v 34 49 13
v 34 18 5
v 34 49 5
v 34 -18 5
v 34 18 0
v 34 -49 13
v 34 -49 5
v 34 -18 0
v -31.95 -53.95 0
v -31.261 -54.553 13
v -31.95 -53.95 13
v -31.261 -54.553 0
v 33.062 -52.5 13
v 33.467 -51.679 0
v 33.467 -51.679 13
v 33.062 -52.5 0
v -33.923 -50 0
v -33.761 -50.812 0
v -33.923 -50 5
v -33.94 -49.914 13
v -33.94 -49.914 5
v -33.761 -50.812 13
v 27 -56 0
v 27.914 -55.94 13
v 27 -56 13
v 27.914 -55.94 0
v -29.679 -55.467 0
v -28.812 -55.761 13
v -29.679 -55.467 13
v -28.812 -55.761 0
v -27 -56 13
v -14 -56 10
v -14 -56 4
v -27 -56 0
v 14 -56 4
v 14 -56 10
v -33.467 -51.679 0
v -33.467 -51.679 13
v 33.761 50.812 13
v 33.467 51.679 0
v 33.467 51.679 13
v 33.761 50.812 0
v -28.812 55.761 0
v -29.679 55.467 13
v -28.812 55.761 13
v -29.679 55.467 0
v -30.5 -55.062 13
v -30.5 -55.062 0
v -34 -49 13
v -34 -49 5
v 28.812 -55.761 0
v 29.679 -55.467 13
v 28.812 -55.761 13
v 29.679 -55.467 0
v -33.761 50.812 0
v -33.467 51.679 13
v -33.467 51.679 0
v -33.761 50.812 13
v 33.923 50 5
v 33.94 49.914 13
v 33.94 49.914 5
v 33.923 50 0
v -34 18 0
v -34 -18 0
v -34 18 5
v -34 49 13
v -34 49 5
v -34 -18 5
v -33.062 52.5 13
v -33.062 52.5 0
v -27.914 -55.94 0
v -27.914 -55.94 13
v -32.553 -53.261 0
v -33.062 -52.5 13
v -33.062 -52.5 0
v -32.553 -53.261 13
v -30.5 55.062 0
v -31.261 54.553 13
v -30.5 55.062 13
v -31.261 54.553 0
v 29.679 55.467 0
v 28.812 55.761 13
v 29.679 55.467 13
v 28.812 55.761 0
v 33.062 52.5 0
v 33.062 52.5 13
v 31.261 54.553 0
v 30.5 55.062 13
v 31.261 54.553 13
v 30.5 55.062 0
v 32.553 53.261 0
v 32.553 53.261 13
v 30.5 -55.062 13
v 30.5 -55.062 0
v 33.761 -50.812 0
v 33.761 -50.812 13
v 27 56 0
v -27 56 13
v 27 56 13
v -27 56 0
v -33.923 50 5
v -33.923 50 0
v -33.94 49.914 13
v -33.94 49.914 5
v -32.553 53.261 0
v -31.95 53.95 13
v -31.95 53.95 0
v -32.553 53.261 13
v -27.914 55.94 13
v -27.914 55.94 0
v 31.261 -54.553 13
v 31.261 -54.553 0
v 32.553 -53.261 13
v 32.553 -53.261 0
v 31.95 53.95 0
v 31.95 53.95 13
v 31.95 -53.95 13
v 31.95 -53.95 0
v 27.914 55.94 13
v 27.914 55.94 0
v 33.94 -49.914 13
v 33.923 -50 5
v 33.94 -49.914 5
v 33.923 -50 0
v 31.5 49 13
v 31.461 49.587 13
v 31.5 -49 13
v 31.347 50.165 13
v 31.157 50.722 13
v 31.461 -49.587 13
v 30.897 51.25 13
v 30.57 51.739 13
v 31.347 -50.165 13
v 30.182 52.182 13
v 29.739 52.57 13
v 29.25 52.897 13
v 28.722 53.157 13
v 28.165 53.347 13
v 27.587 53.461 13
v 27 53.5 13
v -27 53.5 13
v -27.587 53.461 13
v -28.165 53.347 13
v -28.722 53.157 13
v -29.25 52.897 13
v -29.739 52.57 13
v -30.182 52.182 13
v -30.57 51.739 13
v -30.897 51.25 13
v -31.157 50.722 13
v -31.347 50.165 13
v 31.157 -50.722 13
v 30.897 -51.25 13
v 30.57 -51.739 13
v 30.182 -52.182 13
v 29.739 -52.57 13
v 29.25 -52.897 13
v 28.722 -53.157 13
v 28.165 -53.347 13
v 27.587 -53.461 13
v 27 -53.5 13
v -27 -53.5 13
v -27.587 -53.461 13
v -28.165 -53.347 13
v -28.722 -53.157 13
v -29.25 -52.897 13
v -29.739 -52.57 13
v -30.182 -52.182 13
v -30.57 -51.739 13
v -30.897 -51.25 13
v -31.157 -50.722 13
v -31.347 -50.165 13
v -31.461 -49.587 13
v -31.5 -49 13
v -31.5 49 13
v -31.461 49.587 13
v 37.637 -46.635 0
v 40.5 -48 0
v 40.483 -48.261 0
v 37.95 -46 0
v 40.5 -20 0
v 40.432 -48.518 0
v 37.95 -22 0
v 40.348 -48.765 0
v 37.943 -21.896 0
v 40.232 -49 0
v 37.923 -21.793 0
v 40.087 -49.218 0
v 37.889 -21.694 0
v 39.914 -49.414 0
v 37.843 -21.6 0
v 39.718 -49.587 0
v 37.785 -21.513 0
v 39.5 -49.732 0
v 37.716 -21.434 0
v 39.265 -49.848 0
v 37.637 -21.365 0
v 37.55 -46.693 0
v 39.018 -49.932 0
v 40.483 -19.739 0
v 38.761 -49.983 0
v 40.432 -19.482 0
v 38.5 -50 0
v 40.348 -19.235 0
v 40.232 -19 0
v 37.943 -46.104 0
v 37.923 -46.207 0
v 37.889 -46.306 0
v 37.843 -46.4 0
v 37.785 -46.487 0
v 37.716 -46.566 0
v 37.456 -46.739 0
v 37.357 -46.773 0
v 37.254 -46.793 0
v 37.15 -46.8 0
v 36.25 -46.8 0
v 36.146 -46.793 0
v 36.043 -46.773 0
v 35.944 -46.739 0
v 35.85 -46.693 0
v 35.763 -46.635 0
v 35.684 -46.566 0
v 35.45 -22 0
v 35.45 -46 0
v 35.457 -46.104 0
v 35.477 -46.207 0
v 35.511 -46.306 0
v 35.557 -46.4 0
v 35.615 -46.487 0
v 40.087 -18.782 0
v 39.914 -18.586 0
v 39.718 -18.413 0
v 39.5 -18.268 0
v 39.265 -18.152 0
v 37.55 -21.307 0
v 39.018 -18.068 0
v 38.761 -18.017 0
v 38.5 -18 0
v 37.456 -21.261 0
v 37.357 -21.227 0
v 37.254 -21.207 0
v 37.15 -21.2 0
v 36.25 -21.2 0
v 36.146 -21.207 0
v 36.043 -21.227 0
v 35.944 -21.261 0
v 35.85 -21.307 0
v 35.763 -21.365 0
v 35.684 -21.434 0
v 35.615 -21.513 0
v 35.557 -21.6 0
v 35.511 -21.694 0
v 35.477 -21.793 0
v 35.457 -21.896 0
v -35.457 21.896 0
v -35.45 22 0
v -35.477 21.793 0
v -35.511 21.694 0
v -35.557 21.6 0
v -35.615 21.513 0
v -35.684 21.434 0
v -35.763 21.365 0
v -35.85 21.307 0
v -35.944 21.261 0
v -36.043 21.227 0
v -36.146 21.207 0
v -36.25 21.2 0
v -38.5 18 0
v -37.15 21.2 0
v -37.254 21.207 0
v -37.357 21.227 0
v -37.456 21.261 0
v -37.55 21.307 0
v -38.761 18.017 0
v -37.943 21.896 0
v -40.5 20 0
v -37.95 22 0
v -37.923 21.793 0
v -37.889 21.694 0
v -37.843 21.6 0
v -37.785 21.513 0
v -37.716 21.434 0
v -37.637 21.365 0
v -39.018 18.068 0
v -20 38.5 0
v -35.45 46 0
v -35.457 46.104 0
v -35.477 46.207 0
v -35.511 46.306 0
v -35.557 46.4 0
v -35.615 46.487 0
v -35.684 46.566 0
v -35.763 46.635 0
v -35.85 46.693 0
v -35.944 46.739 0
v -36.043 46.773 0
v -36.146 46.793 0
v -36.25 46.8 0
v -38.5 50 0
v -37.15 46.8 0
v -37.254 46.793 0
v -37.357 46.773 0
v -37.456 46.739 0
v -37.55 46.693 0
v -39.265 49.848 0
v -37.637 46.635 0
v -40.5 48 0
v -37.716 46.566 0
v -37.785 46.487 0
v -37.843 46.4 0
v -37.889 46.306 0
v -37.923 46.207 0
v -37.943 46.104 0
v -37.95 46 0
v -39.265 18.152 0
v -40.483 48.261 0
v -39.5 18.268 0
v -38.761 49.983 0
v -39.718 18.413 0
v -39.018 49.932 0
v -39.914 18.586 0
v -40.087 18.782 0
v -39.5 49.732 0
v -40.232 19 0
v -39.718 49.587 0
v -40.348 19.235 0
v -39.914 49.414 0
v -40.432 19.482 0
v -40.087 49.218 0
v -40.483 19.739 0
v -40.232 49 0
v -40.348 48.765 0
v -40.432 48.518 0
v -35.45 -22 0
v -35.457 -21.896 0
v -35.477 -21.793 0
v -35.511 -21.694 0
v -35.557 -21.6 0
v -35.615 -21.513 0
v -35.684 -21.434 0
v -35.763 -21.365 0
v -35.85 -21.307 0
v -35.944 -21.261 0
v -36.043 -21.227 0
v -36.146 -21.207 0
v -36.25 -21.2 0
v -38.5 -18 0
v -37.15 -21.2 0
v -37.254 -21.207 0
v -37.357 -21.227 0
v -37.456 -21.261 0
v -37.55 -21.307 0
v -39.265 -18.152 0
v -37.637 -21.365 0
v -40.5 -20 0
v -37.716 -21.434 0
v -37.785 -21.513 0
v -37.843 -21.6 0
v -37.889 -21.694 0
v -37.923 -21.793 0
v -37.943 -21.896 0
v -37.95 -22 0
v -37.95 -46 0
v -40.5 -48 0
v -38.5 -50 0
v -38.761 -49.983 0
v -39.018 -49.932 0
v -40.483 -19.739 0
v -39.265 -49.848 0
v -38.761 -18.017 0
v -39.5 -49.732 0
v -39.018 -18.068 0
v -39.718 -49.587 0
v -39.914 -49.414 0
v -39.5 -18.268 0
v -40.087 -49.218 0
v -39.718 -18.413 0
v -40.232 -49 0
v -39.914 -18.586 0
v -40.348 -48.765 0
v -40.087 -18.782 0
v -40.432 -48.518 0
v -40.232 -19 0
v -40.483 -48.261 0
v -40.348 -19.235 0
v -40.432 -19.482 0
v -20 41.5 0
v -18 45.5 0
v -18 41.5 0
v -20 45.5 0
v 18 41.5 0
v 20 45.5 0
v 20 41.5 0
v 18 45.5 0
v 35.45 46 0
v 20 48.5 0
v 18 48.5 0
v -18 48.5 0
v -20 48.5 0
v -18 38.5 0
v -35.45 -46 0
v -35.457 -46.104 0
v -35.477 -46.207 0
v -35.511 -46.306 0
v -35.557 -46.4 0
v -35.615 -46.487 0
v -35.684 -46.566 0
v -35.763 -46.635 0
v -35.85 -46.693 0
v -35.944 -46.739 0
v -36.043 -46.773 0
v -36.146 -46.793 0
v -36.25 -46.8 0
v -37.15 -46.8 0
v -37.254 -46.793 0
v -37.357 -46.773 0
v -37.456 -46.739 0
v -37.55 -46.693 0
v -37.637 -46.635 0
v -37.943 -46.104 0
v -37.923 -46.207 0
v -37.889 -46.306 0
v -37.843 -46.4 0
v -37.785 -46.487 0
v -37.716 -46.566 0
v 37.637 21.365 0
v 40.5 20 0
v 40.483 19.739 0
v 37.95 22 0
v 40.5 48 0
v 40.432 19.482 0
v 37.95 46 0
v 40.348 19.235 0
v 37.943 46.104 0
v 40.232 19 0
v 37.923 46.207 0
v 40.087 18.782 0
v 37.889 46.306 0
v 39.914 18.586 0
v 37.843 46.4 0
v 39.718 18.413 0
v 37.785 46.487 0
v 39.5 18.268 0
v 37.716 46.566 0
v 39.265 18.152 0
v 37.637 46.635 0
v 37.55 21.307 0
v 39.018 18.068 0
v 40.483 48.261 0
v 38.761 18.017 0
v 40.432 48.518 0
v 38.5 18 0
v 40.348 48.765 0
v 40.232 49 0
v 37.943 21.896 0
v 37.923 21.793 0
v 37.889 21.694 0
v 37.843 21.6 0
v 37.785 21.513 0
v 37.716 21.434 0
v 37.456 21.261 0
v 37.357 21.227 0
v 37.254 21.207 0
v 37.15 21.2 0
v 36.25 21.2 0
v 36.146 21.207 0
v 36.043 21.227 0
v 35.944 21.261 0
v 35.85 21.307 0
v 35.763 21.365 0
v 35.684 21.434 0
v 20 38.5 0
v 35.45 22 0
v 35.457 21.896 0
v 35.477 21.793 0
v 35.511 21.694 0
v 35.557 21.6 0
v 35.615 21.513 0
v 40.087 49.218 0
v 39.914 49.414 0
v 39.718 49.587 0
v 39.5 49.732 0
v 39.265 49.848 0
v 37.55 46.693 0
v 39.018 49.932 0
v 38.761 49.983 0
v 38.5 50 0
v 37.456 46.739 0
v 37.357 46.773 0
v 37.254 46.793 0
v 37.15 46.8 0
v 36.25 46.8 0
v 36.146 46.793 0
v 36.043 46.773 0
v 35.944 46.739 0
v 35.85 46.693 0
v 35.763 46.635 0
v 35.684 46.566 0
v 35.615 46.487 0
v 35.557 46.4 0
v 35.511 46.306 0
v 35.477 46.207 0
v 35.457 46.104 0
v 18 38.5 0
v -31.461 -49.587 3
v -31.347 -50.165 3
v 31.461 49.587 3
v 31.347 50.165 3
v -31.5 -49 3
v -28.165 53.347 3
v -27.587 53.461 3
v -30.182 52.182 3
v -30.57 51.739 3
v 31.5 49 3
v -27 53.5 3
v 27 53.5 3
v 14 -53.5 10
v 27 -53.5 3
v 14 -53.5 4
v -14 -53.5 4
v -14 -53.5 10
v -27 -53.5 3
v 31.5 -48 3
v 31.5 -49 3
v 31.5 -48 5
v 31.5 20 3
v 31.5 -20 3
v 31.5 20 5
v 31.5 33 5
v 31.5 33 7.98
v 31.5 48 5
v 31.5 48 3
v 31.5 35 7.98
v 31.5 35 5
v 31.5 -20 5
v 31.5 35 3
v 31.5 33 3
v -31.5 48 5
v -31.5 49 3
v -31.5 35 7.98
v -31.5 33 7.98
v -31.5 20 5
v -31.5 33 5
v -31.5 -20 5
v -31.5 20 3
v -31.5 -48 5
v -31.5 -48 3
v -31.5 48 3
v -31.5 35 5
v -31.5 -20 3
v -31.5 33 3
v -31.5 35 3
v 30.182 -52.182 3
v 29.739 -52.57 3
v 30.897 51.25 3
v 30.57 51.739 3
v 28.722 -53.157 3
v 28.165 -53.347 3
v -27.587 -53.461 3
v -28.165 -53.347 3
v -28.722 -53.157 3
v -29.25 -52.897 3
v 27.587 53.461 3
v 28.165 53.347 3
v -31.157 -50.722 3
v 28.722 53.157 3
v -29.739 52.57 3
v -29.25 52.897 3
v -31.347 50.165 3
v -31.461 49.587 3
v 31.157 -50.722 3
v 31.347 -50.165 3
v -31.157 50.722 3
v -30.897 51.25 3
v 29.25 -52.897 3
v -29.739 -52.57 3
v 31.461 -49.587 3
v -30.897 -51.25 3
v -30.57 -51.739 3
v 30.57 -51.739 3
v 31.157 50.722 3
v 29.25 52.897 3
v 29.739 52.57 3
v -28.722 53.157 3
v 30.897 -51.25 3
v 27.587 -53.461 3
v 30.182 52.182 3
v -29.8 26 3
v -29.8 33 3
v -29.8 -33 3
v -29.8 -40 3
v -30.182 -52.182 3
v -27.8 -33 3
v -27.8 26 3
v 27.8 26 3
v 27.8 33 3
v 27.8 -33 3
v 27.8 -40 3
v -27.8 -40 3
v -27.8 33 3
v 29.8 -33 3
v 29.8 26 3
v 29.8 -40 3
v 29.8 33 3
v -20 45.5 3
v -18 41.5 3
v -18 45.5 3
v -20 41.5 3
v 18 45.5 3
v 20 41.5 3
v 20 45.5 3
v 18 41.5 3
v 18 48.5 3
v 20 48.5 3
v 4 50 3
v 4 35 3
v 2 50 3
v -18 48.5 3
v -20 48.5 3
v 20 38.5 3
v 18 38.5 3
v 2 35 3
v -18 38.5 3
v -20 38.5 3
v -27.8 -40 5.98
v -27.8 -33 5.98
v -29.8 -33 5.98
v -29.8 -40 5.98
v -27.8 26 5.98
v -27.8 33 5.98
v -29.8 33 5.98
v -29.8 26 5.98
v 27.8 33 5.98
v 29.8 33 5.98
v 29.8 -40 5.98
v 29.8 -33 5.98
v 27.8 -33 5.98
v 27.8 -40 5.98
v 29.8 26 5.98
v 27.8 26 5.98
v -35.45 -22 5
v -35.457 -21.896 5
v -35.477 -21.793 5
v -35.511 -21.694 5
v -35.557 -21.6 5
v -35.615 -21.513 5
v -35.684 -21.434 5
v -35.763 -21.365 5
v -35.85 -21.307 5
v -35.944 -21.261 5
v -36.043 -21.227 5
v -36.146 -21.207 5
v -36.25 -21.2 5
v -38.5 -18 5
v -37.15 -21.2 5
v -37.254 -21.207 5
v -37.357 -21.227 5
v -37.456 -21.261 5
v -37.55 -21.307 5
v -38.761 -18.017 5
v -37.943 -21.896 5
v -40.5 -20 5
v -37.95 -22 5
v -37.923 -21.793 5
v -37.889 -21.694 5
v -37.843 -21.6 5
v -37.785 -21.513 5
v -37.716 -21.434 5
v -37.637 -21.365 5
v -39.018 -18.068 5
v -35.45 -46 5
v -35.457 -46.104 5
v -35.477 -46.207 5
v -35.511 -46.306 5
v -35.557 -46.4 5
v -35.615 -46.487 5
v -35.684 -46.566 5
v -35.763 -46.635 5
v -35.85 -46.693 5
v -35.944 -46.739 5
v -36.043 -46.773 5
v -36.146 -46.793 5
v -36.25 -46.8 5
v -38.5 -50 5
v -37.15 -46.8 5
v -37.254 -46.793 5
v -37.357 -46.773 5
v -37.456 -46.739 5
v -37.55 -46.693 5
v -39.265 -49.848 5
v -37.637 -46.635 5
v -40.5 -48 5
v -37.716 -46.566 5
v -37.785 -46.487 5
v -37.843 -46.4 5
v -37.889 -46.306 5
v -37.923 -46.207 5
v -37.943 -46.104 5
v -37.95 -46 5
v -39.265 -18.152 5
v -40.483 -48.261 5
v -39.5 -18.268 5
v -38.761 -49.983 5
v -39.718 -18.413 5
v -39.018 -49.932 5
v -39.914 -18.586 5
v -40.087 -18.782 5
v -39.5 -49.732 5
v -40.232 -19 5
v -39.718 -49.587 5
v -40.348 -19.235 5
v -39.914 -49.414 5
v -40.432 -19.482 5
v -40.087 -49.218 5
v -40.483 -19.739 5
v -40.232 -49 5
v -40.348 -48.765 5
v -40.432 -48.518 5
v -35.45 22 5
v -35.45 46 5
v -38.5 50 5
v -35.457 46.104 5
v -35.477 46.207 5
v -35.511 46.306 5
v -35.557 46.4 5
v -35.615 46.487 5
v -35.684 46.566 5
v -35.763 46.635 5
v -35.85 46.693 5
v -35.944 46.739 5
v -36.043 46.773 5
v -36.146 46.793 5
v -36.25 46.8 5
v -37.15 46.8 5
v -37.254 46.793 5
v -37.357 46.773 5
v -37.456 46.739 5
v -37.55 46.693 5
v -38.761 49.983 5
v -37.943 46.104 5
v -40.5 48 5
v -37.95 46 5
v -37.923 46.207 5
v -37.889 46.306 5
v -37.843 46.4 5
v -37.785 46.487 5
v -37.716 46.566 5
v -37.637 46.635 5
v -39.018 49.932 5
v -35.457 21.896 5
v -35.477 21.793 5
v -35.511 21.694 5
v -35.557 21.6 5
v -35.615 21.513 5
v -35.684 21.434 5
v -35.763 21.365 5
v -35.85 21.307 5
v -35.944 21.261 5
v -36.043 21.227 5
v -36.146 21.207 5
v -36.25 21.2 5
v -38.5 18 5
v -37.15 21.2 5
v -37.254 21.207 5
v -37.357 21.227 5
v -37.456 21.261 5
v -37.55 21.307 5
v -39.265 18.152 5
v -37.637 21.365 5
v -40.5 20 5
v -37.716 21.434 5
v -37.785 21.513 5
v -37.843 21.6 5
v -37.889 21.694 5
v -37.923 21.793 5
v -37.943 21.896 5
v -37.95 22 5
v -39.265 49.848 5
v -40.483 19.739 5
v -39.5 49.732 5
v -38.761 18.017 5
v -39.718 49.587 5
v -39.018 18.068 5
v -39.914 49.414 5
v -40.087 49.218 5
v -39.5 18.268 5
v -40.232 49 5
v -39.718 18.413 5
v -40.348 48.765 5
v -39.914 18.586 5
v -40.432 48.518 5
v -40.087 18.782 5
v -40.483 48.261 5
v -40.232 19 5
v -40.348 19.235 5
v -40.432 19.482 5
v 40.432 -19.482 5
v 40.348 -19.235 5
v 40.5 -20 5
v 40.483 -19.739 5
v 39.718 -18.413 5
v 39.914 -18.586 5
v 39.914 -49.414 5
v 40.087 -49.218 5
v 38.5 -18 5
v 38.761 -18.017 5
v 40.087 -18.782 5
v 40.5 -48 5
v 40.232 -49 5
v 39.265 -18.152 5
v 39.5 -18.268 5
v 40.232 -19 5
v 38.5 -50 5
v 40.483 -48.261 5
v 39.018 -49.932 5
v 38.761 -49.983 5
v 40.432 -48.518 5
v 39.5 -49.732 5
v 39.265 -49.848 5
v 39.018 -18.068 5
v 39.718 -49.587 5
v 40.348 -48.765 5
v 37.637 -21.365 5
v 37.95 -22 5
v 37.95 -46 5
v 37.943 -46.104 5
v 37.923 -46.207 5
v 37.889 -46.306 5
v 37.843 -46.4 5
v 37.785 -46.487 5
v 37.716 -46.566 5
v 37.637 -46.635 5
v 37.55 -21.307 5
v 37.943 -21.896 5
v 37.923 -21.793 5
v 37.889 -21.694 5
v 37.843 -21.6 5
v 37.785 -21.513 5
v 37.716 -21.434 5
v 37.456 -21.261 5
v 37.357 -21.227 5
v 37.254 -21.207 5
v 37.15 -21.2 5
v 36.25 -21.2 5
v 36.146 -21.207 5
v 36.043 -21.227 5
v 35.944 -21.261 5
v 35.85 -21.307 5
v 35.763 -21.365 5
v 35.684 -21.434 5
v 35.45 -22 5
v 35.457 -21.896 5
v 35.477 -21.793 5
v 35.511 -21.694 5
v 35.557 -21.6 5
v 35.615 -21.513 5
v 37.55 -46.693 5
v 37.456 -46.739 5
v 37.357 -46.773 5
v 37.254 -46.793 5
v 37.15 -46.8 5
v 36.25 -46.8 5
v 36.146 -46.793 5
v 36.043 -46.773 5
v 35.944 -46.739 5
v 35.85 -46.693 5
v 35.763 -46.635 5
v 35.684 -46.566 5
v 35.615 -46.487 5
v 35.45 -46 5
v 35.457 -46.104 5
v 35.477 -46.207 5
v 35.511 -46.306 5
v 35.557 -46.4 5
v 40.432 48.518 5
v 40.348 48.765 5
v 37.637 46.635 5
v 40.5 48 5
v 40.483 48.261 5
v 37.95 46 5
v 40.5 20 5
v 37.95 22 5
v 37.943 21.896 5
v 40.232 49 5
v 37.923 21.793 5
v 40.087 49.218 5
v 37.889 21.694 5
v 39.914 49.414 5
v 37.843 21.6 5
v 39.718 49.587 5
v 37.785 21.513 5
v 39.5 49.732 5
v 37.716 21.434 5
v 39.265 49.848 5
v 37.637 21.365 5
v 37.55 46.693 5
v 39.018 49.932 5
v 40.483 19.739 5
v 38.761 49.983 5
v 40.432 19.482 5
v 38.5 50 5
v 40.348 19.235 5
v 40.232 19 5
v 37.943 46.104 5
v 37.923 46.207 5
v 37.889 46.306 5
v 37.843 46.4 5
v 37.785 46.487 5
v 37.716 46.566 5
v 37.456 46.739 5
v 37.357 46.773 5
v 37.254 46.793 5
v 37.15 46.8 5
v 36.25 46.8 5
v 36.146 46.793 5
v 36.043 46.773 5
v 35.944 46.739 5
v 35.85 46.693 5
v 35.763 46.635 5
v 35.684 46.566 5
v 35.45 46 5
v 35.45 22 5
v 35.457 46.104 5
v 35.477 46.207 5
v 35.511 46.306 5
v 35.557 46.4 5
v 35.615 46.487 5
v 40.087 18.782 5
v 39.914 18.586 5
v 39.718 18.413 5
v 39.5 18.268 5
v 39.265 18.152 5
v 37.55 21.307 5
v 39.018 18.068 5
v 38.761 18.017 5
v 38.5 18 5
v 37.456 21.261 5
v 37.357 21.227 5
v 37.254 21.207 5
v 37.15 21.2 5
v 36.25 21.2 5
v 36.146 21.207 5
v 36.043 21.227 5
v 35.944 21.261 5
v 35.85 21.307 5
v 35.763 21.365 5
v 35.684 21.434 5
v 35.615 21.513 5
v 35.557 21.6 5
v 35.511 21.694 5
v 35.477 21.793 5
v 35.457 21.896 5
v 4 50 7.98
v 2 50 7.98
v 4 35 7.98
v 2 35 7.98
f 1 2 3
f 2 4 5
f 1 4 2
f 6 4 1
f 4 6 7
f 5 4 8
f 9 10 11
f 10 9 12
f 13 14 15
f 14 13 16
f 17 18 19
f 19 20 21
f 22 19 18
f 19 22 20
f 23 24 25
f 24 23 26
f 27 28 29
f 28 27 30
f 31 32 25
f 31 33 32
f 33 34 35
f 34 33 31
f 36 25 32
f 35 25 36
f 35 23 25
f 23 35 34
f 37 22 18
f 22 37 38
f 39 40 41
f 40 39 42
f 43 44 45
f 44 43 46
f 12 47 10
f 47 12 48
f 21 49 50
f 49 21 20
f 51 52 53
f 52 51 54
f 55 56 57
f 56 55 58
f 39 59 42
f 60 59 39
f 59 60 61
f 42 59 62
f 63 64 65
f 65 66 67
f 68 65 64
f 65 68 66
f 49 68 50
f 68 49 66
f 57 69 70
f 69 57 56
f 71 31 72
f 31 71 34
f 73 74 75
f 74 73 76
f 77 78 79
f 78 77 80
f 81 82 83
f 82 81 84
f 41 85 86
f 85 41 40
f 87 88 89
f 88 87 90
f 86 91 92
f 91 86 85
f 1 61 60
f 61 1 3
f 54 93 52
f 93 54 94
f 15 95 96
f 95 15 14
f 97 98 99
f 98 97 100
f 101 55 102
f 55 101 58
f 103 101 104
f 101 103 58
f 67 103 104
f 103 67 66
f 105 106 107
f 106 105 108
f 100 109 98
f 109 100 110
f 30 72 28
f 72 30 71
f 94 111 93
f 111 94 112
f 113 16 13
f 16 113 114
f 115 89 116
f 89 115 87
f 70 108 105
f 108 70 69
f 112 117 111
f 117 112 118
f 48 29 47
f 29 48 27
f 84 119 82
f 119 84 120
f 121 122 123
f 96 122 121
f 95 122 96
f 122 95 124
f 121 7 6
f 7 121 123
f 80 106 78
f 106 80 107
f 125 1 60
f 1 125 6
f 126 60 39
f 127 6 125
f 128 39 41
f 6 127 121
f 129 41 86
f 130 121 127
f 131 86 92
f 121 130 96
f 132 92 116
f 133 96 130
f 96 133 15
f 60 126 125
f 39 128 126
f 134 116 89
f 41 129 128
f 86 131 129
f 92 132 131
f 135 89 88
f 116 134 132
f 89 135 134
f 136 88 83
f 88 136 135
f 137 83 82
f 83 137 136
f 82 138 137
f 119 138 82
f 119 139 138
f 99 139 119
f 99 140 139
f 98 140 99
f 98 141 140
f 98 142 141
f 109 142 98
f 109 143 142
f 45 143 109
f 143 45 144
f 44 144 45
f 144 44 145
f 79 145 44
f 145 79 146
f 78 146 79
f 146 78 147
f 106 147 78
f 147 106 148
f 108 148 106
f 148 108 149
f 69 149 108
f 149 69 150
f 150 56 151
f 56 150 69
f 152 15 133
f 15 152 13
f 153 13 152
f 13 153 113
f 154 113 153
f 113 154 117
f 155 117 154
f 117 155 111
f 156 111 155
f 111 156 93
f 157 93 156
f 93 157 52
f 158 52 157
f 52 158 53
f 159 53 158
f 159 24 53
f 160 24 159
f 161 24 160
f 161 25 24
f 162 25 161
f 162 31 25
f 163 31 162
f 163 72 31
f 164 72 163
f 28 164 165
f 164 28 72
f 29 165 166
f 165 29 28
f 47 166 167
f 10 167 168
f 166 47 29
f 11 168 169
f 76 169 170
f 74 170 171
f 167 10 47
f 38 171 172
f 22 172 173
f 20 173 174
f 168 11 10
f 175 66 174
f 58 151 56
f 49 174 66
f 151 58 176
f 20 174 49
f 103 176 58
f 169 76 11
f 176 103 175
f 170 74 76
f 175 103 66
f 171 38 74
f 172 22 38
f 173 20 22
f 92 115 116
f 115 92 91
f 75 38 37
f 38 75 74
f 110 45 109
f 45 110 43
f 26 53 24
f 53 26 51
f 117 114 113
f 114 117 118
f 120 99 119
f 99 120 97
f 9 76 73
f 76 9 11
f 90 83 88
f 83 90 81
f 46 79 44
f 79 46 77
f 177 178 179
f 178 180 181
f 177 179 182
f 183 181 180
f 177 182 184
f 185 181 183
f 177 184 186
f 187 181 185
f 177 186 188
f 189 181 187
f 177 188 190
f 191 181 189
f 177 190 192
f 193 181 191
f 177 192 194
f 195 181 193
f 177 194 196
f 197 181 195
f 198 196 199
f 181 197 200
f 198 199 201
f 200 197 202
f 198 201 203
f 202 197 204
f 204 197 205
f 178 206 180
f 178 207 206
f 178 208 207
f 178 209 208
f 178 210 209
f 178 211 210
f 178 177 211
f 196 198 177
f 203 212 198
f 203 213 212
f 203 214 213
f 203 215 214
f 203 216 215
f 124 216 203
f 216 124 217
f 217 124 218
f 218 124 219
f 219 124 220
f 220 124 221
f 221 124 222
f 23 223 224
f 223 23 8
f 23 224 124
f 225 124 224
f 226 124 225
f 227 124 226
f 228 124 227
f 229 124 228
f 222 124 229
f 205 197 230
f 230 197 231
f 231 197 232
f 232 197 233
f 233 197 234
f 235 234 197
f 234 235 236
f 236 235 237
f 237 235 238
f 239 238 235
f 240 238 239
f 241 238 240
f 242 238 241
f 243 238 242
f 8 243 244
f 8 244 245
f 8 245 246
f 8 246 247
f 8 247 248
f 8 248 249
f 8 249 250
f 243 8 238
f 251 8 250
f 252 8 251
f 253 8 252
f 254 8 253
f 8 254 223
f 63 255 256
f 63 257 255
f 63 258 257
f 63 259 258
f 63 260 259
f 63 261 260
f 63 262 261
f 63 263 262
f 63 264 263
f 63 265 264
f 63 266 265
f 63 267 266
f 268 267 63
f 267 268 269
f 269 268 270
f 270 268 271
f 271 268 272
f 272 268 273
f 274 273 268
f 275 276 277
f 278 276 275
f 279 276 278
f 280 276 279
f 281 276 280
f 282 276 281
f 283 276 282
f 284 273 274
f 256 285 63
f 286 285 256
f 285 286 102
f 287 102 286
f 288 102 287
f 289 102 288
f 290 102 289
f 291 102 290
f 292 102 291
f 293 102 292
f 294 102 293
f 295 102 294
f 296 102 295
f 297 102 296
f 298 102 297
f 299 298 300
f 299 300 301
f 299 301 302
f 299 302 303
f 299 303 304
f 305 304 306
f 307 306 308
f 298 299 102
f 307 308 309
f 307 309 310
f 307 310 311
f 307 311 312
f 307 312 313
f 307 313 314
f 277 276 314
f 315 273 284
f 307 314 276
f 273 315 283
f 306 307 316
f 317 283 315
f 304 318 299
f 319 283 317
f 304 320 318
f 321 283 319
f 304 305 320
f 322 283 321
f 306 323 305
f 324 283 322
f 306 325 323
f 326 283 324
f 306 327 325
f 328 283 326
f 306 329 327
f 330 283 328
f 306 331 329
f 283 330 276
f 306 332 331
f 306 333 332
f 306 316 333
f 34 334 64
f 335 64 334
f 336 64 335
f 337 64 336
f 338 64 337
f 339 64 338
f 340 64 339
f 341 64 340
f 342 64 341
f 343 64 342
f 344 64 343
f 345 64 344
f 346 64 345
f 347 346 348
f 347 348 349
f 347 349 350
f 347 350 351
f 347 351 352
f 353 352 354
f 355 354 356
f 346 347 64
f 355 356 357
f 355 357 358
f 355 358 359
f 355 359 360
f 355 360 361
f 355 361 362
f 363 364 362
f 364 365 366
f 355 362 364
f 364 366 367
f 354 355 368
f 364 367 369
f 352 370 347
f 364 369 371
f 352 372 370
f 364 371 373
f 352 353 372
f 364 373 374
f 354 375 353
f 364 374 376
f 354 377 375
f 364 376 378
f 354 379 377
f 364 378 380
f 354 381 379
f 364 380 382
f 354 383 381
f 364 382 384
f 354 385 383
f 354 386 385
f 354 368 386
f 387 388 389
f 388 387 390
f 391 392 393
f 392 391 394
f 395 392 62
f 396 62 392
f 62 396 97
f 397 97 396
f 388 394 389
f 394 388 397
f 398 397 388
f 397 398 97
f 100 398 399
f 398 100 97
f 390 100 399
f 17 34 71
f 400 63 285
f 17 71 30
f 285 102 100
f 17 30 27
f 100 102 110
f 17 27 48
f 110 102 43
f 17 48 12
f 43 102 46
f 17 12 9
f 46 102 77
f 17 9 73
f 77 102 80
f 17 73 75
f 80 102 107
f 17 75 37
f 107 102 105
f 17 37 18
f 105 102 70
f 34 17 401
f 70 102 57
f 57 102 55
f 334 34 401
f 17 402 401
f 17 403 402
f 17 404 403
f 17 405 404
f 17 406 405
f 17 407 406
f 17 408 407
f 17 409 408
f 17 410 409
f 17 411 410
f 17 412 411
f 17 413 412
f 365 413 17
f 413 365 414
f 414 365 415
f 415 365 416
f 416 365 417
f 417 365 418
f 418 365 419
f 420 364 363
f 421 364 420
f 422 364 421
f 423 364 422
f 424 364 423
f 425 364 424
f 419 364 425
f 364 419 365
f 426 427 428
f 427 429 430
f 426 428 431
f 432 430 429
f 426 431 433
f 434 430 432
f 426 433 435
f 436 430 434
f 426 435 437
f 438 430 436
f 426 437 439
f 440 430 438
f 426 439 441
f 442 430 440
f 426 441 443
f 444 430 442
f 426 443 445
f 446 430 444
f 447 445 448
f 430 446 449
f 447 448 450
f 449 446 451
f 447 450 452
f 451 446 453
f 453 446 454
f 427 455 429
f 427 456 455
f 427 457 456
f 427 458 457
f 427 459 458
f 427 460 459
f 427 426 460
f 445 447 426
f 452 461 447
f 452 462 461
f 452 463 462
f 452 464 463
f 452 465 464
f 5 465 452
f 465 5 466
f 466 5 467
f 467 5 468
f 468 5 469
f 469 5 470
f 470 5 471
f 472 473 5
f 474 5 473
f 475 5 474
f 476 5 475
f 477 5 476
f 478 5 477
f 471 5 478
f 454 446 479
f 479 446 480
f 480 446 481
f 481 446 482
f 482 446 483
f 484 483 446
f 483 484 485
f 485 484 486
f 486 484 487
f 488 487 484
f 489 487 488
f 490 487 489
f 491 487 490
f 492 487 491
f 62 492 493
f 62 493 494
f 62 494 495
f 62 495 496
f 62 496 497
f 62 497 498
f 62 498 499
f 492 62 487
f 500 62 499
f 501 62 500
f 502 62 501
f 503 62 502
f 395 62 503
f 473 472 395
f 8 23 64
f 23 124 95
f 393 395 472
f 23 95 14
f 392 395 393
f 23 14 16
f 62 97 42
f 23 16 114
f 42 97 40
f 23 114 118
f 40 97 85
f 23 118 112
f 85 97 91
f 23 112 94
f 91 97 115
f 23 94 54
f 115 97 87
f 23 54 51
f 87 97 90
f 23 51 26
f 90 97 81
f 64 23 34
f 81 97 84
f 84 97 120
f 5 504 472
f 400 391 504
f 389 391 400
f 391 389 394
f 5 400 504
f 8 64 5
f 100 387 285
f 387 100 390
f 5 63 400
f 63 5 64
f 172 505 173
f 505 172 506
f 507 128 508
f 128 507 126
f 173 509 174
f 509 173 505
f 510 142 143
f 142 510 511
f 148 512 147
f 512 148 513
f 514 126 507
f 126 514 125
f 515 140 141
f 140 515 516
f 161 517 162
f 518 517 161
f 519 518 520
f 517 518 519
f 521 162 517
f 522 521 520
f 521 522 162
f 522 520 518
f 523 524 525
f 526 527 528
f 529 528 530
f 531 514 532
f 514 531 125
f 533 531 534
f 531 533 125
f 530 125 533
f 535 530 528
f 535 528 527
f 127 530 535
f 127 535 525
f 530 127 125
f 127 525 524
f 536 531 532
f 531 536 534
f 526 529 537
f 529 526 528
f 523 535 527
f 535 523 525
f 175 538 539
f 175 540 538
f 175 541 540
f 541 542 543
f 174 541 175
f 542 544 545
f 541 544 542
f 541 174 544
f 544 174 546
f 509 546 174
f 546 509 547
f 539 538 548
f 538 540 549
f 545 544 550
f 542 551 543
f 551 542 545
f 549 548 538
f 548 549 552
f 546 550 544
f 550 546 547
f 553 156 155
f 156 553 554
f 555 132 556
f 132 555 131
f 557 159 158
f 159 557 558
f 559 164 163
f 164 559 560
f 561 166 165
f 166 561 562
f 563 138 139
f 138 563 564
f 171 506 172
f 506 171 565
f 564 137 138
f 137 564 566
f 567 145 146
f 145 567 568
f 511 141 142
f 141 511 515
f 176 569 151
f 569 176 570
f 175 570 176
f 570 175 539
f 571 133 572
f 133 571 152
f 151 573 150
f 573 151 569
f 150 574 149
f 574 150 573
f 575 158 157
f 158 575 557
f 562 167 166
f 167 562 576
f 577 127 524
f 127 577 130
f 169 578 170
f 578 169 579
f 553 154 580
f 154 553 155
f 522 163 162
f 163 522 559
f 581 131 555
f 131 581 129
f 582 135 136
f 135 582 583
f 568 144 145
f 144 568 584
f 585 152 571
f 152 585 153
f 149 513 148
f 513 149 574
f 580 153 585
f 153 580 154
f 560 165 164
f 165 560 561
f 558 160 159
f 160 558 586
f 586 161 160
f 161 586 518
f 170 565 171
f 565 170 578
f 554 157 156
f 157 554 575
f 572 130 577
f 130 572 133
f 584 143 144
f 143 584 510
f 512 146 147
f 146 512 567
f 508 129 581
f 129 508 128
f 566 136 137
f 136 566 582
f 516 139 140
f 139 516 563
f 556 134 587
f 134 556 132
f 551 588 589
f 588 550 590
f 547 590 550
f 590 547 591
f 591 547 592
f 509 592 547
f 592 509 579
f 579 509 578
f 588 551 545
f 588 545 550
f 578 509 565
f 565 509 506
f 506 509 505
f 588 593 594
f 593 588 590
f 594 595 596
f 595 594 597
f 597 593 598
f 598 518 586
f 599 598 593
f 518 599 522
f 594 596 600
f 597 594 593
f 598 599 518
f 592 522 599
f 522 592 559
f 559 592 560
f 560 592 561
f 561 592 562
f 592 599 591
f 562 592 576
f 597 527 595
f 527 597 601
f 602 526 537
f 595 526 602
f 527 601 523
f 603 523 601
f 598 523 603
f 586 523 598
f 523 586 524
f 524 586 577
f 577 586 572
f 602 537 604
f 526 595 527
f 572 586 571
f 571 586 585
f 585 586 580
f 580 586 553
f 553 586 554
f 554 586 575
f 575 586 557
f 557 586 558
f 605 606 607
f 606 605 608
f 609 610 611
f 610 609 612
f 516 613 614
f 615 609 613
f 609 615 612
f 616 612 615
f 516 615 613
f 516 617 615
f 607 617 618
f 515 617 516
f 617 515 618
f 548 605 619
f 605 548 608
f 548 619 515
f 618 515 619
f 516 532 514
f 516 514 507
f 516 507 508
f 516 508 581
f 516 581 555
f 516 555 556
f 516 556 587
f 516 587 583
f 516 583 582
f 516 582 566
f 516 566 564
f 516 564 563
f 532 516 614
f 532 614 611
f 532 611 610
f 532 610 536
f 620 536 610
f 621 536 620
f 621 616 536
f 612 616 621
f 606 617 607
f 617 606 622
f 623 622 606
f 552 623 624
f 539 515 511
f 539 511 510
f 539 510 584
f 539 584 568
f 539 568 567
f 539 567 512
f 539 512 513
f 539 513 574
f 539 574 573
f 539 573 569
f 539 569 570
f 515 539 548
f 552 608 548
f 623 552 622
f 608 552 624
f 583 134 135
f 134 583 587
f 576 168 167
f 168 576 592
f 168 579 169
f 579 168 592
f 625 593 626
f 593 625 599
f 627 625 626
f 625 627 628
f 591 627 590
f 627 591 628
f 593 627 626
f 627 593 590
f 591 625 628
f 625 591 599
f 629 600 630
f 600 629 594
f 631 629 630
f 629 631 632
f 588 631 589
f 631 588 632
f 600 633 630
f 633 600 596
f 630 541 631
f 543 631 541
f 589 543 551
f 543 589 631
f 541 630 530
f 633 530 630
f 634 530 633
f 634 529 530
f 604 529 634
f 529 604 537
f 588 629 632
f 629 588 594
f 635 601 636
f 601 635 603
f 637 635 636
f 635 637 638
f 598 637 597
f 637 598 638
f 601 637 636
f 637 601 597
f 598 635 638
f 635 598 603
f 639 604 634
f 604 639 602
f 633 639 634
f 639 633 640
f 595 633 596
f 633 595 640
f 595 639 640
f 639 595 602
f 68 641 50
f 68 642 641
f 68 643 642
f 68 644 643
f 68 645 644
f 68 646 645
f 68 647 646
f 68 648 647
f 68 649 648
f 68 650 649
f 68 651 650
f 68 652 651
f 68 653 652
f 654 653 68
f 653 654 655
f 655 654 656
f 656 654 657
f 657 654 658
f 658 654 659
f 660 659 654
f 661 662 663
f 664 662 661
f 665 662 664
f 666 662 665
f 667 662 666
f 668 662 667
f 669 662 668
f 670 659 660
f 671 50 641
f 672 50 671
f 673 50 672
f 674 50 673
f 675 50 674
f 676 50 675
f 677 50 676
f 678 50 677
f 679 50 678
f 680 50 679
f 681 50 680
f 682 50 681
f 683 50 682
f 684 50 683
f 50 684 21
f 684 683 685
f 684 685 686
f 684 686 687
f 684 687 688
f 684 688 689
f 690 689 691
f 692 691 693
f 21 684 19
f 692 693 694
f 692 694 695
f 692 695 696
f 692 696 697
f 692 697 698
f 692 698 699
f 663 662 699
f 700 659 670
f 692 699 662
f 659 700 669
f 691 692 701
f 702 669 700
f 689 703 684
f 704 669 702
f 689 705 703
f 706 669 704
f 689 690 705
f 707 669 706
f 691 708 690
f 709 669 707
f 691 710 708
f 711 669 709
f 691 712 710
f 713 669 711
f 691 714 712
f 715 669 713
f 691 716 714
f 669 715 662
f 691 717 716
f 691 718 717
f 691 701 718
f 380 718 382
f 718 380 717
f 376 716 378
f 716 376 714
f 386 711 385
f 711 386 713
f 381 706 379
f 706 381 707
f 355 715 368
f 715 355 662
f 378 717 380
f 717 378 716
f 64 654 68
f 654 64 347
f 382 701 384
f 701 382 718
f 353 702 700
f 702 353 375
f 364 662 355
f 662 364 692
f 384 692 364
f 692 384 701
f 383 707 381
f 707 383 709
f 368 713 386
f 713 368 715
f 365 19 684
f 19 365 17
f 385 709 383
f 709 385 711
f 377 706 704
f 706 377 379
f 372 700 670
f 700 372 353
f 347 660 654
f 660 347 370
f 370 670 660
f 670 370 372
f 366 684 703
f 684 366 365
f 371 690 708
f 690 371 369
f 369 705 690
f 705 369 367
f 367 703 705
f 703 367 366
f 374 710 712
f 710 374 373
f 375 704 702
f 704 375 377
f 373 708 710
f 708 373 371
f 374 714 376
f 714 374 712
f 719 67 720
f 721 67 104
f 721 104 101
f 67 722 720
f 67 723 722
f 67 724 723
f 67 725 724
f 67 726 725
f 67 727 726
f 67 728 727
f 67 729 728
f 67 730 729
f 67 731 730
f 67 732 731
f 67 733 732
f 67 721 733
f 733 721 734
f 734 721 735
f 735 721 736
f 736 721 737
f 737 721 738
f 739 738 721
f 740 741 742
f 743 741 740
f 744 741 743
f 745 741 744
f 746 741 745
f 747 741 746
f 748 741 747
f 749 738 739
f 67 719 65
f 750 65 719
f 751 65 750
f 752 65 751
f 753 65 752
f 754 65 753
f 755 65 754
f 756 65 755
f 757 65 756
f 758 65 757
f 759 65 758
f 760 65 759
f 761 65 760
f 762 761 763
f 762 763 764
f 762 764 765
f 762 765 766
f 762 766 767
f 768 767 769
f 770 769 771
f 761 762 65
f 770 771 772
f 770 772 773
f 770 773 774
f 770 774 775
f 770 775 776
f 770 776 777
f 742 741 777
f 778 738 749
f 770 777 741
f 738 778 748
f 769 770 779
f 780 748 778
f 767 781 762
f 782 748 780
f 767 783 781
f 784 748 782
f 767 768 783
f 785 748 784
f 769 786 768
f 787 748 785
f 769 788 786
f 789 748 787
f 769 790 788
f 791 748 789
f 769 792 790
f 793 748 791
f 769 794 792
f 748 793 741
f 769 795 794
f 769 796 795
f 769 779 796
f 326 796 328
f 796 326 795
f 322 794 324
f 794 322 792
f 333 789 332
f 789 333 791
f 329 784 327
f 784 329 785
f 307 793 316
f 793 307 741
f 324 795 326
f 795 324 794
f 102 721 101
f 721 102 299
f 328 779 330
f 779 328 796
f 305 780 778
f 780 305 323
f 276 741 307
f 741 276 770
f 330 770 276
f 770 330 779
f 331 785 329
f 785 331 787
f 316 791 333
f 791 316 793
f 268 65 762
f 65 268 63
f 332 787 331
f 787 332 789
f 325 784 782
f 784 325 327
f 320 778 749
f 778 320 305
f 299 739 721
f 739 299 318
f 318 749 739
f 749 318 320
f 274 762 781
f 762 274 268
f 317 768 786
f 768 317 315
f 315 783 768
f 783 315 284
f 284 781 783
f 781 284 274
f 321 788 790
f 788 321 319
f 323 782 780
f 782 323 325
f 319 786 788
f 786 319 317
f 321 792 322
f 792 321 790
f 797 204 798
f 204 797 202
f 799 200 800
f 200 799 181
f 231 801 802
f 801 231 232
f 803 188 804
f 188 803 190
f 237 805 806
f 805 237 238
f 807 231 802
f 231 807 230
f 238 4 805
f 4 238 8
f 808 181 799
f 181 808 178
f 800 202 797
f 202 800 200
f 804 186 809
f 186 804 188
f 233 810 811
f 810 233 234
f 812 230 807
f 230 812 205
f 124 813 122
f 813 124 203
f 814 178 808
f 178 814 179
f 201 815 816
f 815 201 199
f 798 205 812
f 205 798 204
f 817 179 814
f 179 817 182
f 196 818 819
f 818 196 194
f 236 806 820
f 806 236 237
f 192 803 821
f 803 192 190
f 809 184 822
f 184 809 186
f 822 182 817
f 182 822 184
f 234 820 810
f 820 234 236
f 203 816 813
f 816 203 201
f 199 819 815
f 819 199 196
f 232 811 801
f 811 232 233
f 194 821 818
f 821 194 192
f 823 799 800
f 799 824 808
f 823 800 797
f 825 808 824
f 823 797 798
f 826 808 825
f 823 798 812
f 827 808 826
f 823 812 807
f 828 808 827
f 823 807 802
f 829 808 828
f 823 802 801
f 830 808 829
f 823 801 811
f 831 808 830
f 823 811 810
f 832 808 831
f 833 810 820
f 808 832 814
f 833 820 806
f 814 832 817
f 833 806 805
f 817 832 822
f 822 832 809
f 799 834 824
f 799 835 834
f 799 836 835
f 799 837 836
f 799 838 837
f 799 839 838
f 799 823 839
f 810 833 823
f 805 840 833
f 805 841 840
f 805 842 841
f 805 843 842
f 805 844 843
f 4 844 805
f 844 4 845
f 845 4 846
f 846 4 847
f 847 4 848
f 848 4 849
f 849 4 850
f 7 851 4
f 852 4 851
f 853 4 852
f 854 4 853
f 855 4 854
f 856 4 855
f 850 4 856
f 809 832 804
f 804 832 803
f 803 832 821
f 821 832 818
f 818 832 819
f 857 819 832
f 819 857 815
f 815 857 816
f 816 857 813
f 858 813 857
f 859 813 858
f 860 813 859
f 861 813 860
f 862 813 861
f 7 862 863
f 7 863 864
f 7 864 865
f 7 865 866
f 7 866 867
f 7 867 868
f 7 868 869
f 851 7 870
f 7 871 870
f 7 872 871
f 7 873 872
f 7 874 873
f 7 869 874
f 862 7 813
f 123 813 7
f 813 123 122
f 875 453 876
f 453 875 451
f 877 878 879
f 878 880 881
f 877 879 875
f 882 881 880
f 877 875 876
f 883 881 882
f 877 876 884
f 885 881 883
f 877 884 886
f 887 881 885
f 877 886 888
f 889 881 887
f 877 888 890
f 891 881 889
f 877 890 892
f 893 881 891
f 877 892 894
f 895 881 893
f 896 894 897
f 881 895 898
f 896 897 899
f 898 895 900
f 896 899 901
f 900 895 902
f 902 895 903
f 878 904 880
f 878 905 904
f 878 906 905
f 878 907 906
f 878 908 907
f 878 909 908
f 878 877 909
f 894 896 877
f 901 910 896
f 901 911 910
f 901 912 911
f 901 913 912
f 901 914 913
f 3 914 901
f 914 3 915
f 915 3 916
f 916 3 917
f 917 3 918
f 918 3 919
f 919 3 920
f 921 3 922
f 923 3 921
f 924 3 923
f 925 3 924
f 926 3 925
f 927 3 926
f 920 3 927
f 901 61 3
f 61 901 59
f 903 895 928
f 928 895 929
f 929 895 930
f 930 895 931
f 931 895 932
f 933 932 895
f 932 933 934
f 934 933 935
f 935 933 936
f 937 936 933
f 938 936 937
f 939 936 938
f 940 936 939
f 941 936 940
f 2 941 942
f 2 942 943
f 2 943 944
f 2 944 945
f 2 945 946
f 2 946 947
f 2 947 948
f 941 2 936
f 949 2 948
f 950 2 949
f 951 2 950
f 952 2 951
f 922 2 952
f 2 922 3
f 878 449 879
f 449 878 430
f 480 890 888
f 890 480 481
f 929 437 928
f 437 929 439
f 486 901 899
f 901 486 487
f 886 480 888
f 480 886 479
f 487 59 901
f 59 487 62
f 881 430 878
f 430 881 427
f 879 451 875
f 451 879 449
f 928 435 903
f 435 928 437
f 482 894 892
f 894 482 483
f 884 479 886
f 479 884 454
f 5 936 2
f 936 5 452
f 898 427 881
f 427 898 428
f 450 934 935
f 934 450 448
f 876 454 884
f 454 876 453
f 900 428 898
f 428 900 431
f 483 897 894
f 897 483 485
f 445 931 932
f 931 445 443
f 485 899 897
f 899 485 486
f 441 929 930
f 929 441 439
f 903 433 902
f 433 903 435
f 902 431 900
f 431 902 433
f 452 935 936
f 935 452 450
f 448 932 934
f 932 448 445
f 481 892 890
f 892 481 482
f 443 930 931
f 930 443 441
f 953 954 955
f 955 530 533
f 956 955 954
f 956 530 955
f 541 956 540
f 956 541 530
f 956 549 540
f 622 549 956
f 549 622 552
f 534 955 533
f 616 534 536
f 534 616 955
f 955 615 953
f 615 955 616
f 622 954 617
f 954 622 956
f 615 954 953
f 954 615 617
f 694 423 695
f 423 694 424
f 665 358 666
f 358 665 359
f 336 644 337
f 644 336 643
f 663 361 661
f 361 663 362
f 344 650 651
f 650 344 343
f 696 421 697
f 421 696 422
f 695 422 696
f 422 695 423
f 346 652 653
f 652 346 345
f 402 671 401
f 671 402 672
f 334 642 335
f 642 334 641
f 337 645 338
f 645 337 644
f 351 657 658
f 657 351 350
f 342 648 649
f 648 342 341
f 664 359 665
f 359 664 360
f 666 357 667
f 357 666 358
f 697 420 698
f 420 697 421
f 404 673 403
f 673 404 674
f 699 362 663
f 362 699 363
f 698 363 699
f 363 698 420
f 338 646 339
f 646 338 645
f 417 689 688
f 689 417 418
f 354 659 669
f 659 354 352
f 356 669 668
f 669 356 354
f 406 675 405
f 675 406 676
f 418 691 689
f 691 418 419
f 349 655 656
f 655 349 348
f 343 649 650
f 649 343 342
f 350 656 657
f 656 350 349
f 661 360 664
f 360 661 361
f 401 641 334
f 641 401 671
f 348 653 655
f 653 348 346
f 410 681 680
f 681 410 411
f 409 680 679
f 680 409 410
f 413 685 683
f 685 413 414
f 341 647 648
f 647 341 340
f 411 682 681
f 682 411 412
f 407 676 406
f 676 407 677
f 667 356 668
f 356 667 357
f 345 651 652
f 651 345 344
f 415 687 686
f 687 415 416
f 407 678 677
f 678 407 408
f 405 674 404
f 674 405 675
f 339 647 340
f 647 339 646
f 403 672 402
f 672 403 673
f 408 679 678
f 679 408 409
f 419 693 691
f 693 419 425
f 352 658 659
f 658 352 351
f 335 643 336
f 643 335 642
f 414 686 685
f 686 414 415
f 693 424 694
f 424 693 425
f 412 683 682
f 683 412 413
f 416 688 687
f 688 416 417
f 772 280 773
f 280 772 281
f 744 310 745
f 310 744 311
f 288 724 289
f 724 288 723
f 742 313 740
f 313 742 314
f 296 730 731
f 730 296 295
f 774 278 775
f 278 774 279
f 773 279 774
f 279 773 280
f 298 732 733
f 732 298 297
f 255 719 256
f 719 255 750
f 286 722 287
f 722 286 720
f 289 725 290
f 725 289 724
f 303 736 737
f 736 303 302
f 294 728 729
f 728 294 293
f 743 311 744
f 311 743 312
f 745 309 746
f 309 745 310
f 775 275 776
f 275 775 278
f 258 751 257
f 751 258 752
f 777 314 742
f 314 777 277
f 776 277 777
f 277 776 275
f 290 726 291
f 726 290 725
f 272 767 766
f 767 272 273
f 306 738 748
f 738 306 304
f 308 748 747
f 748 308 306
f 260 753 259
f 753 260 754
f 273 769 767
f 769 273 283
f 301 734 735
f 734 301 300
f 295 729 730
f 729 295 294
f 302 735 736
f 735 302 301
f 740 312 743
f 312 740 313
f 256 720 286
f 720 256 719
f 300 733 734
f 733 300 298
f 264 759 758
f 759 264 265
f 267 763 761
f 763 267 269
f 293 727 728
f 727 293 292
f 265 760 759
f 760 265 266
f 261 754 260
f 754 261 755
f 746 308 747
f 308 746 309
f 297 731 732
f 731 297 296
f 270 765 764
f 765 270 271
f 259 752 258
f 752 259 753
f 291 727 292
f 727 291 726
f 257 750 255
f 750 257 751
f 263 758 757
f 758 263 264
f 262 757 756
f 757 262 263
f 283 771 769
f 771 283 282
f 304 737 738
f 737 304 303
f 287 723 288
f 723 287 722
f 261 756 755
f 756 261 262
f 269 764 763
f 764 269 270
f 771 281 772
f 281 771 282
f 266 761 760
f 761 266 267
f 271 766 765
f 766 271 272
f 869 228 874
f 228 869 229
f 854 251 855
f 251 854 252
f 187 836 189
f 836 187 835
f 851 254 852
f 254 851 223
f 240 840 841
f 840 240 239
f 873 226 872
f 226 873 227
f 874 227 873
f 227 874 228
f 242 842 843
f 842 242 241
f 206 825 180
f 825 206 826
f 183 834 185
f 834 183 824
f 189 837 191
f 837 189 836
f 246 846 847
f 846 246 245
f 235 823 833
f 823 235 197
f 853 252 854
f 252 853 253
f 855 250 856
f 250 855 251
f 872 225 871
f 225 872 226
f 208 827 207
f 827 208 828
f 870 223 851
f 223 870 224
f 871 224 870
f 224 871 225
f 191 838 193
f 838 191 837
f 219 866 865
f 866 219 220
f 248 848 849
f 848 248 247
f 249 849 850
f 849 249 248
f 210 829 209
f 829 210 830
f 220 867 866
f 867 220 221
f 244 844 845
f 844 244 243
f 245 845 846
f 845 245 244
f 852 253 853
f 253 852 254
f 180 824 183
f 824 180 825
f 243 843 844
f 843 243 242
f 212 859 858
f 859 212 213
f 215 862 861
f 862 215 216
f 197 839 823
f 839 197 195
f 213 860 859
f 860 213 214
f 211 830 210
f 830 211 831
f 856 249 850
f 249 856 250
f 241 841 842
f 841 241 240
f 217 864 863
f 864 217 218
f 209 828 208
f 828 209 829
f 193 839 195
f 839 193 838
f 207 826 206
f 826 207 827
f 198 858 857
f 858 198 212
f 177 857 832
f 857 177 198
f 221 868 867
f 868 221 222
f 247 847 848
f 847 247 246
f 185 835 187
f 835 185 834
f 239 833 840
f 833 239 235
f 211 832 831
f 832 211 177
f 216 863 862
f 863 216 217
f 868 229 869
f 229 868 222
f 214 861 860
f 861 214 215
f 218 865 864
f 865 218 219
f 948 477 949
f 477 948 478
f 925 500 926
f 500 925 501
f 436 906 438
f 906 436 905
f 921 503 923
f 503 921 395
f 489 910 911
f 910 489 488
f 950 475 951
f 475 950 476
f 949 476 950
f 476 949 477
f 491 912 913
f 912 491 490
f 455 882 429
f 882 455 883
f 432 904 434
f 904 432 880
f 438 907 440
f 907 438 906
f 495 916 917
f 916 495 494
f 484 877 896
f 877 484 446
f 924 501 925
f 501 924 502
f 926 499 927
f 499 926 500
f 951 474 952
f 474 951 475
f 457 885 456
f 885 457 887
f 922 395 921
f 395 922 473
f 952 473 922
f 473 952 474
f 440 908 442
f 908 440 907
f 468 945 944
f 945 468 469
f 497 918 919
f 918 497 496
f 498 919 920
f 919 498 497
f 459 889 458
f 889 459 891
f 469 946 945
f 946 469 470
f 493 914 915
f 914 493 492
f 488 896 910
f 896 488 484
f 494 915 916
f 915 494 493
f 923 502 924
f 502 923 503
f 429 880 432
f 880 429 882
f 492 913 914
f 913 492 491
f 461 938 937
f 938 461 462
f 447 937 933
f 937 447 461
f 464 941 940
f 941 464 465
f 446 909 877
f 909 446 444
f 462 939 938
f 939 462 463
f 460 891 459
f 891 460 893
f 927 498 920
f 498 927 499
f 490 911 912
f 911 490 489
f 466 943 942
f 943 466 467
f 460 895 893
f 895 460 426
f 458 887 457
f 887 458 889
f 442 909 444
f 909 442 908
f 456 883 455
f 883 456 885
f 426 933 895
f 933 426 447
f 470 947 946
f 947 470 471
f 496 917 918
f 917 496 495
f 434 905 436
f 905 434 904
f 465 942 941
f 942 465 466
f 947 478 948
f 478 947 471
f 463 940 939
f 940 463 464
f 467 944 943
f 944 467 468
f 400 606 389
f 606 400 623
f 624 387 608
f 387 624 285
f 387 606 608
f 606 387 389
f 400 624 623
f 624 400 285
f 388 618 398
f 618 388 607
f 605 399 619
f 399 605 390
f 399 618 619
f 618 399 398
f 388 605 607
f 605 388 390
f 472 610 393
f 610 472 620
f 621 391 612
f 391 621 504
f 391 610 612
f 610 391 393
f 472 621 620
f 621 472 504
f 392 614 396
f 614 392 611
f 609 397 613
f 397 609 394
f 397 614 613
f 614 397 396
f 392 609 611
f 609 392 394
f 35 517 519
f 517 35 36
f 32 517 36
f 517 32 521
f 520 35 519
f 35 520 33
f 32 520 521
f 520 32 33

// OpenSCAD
// file: params.scad
// FEEL greenfield V1 — millimetres/degrees. NOT recovered original CAD.
// All hardware fit values are UNMEASURED. See README before printing.
measurements_confirmed = false;
horn_fit_confirmed = false;
$fn = 48;
epsilon = 0.02;
columns = 7;
rows = 4;
pitch = 12;
row_y0 = -8;                  // New layout assumption: room for wrist-side servos.
body_w = 88.6;
body_l = 88.8;
body_h = 35;
corner_r = 9;
bottom_chamfer = 3;
finger_edge_r = 3;
wall = 2.5;
floor_h = 2.5;
face_t = 2.5;
dome_h = 3;
dome_radius = 43.5;           // Spherical cap footprint; corners remain flat.
strap_span = 101;
strap_w = 25;
strap_slot = 2.5;
second_strap = false;         // v7 prose said off, despite showing true in its table.
finger_scallops = false;
keep_lower_tab = false;
hole_d = 4.366;               // Nominal 11/64 inch FINISHED hole, not printer proof.
pin_d = 4.2;
pin_tip_r = 2.1;
pin_foot_tip_d = 0.6;
pin_cone_half_angle = 30;     // Assumption: 30 degrees from axis (60 included).
pin_collar_d = 6;
pin_collar_h = 0.5;
pin_collar_z = 6.7;           // From low pin foot; gives 4→2mm foam cavity.
rest_proud = -1.5;
stroke = 2;
band_angles = [0, 58, 117, 175];
gap_angles = [29, 87.5, 146];
tap_degrees = 21;
cam_base_r = 3.8;
cam_half_width = 24;
cam_exponents = [2.2, 2.5, 1.6]; // A / H (flatter crest) / G (lower flank slope).
cam_step = 1;                // Actual polygon resolution, also used by cam_sim.
cam_t = 3;
shaft_d = 3;
shaft_flat = 1.0;            // D flat plane X=+1mm, shaft radius 1.5mm.
shaft_length = 58;
shaft_origin_y = 38;
shaft_axis_z = 17.5;
bearing_clearance = 0.35;
bearing_y = [-13, 35];
bearing_t = 3;
guide_z = 26.7;
guide_t = 1.2;               // New thin-guide assumption; stiffness unverified.
screw_d = 3.3;
screw_pilot_d = 2.7;
screw_x = 40.5;
screw_y = [-14, -2, 10, 34];
foam_h = 5;                 // Two 3+2mm strips are a TEST; preload is unverified.
servo_case_w = 8.3;         // Overall manufacturer B; measure actual case.
servo_case_z = 20;          // Overall manufacturer A, oriented upright.
servo_case_depth = 13.3;    // UNMEASURED case alone; published C=17.3 includes shaft.
servo_face_y = -25;
servo_axis_from_top = 5;    // UNMEASURED
servo_tab_span = 26;        // UNMEASURED
servo_tab_t = 1.5;          // UNMEASURED
servo_tab_from_face = 1.5;  // UNMEASURED
servo_spline_d = 3.8;       // UNMEASURED — do not force a printed spline.
servo_spline_h = 2.5;       // UNMEASURED
servo_spline_teeth = 20;    // Manufacturer spec; tooth shape remains unmeasured.
fit_clearance = 0.3;
horn_hub_d = 4.7;           // UNMEASURED
horn_hub_h = 2.2;           // UNMEASURED
horn_arm_w = 3.2;           // UNMEASURED
horn_arm_t = 1.2;           // UNMEASURED
horn_hole_radius = 3.2;     // UNMEASURED
coupling_d = 10;
coupling_h = 7;
coupling_shaft_depth = 4;
pack_breadboard_w = 55;     // UNMEASURED 400-point board envelope.
pack_breadboard_l = 82;
pack_w = 68;
pack_l = 112;
pack_h = 13;
pack_floor = 3;
pack_adapter_w = 22;        // UNMEASURED
pack_adapter_l = 15;
pack_cap_d = 14;            // UNMEASURED

function col_x(c) = (c - (columns-1)/2)*pitch;
function row_y(r) = row_y0 + r*pitch;
function dome_R() = (dome_radius*dome_radius+dome_h*dome_h)/(2*dome_h);
function dome_at(x,y) = dome_h <= 0 || x*x+y*y >= dome_radius*dome_radius ? 0 :
    sqrt(dome_R()*dome_R()-x*x-y*y) - (dome_R()-dome_h);
function pin_length(c,r,domed=true) = body_h + rest_proud +
    (domed ? dome_at(col_x(c),row_y(r)) : 0) - (shaft_axis_z+cam_base_r);
function angular_distance(a,b) = abs(((a-b+540)%360)-180);
function cam_radius(theta,band,variant=0) = cam_base_r + stroke *
    max(0,1-pow(angular_distance(theta,90+band_angles[band])/cam_half_width,cam_exponents[variant]));
function cam_points(band,variant=0) = [for(a=[0:cam_step:360-cam_step])
    [cam_radius(a,band,variant)*cos(a),cam_radius(a,band,variant)*sin(a)]];
function screw_positions() = [for(x=[-screw_x,screw_x],y=screw_y) [x,y]];
// file: lib.scad
include <params.scad>

module rounded_rect(w,l,r) {
    assert(w>2*r && l>2*r);
    hull() for(x=[-w/2+r,w/2-r],y=[-l/2+r,l/2-r]) translate([x,y]) circle(r=r);
}
module rounded_box(w,l,h,r=3) { linear_extrude(h) rounded_rect(w,l,r); }
module bore_y(d,length) { rotate([90,0,0]) cylinder(d=d,h=length,center=true); }
module d_shaft(h,clearance=0) {
    intersection() {
        cylinder(d=shaft_d+clearance,h=h);
        translate([-shaft_d,-shaft_d,-epsilon]) cube([shaft_d+shaft_flat+clearance/2,2*shaft_d,h+2*epsilon]);
    }
}
module camshaft(variant=0) {
    assert(2*(cam_base_r+stroke)<pitch,"Adjacent nominal cam envelopes overlap");
    union() {
        cylinder(d=shaft_d,h=shaft_length-coupling_shaft_depth);
        translate([0,0,shaft_length-coupling_shaft_depth-epsilon]) d_shaft(coupling_shaft_depth+epsilon);
        for(r=[0:rows-1]) translate([0,0,shaft_origin_y-row_y(r)-cam_t/2])
            linear_extrude(cam_t) polygon(cam_points(r,variant));
    }
}
module shaft_in_place(c=0,angle=0,variant=0) {
    translate([col_x(c),shaft_origin_y,shaft_axis_z]) rotate([0,angle,0]) rotate([90,0,0]) camshaft(variant);
}
module pin(len=12.2,tip_r=pin_tip_r) {
    cone_h=(pin_d-pin_foot_tip_d)/2/tan(pin_cone_half_angle);
    assert(len>cone_h+tip_r+1);
    union() {
        cylinder(d1=pin_foot_tip_d,d2=pin_d,h=cone_h);
        translate([0,0,cone_h-epsilon]) cylinder(d=pin_d,h=len-tip_r-cone_h+epsilon-0.6);
        translate([0,0,len-tip_r-0.6-epsilon]) cylinder(d1=pin_d,d2=2*tip_r,h=0.6+2*epsilon);
        translate([0,0,len-tip_r]) intersection() {
            sphere(r=tip_r);
            translate([-tip_r,-tip_r,-epsilon]) cube([2*tip_r,2*tip_r,tip_r+epsilon]);
        }
        translate([0,0,pin_collar_z]) cylinder(d=pin_collar_d,h=pin_collar_h);
    }
}
module pin_plate(nc=7,tip_r=pin_tip_r,domed=true) {
    plate_w=(nc-1)*pitch+10;
    ymid=(row_y(0)+row_y(rows-1))/2;
    // Breakaway frame, runners and foot tabs keep every pin one connected mesh.
    difference() {
        translate([0,ymid,0]) rounded_box(plate_w,rows*pitch+6,1,2);
        translate([0,ymid,-epsilon]) rounded_box(plate_w-3,rows*pitch+3,1+2*epsilon,1);
    }
    for(c=[0:nc-1]) {
        x=(c-(nc-1)/2)*pitch;
        translate([x,row_y(rows-1)+8.2,0.85]) linear_extrude(0.45)
            text(nc==1?"TEST":str("C",c),size=1.5,halign="center",valign="center");
        translate([x+3.2,row_y(0)-8,0]) cube([1.4,(rows-1)*pitch+16,1]);
        for(r=[0:rows-1]) {
            translate([x,row_y(r),0]) pin(domed ? pin_length(c,r,true) : pin_length(3,r,false),tip_r);
            translate([x,row_y(r)-0.35,0.35]) cube([3.8,0.7,0.45]);
        }
    }
}
module lower_bearing(x,y) {
    difference() {
        translate([x-4.2,y-bearing_t/2,floor_h-epsilon]) cube([8.4,bearing_t,shaft_axis_z-floor_h+epsilon]);
        translate([x,y,shaft_axis_z]) bore_y(shaft_d+bearing_clearance,bearing_t+2*epsilon);
    }
}
module upper_bearing(x,y) {
    difference() {
        translate([x-4.2,y-bearing_t/2,shaft_axis_z]) cube([8.4,bearing_t,guide_z-shaft_axis_z+epsilon]);
        translate([x,y,shaft_axis_z]) bore_y(shaft_d+bearing_clearance,bearing_t+2*epsilon);
    }
}
module servo_nominal() {
    bottom=shaft_axis_z-(servo_case_z-servo_axis_from_top);
    translate([-servo_case_w/2,servo_face_y-servo_case_depth,bottom]) cube([servo_case_w,servo_case_depth,servo_case_z]);
    translate([-servo_case_w/2,servo_face_y-servo_tab_from_face-servo_tab_t,bottom+servo_case_z]) cube([servo_case_w,servo_tab_t,(servo_tab_span-servo_case_z)/2]);
    if(keep_lower_tab) translate([-servo_case_w/2,servo_face_y-servo_tab_from_face-servo_tab_t,bottom-(servo_tab_span-servo_case_z)/2]) cube([servo_case_w,servo_tab_t,(servo_tab_span-servo_case_z)/2]);
    translate([0,servo_face_y+servo_spline_h/2,shaft_axis_z]) bore_y(servo_spline_d,servo_spline_h+epsilon);
}
module coupling(kind=1) {
    clear=fit_clearance+(kind==2?0.2:0);
    difference() {
        cylinder(d=coupling_d,h=coupling_h);
        // Bed side mates to the D-shaft; top side captures a measured horn.
        translate([0,0,-epsilon]) d_shaft(coupling_shaft_depth+epsilon,clear);
        if(kind<3) {
            translate([0,0,coupling_h-horn_hub_h]) cylinder(d=horn_hub_d+clear,h=horn_hub_h+epsilon);
            translate([-coupling_d/2-epsilon,-(horn_arm_w+clear)/2,coupling_h-horn_arm_t]) cube([coupling_d+2*epsilon,horn_arm_w+clear,horn_arm_t+epsilon]);
            // Two tie holes hold a real horn arm; the supplied centre screw stays accessible.
            for(x=[-horn_hole_radius-0.4,horn_hole_radius+0.4]) translate([x,0,coupling_h-horn_hub_h-0.4]) cylinder(d=1.2,h=horn_hub_h+1);
        } else {
            // SIZING COUPON ONLY: smooth nominal bore, NOT a reproduced 20T spline.
            translate([0,0,coupling_h-servo_spline_h]) cylinder(d=servo_spline_d+clear,h=servo_spline_h+epsilon);
        }
        translate([0,0,-epsilon]) cylinder(d=1.6,h=coupling_h+2*epsilon);
    }
}
module foam_template(nc=7) {
    w=nc==1?9:(columns-1)*pitch+9;
    difference() {
        translate([0,(row_y(0)+row_y(rows-1))/2,0]) rounded_box(w,rows*pitch+1,1.2,1.5);
        for(c=[0:nc-1],r=[0:rows-1]) translate([(c-(nc-1)/2)*pitch,row_y(r),-epsilon]) cylinder(d=hole_d,h=1.2+2*epsilon);
        if(nc>1) for(c=[0:columns-2]) translate([col_x(c)+pitch/2-0.25,row_y(0)-3,0.6]) cube([0.5,(rows-1)*pitch+6,0.7]);
    }
}
// main file
include <lib.scad>
part = is_undef(part)?"pack_tray":part;
module pack_tray() {
    difference() {
        union() {
            difference() {
                rounded_box(pack_w,pack_l,pack_h,7);
                translate([0,0,pack_floor]) rounded_box(pack_w-5,pack_l-5,pack_h+1,4.5);
            }
            // Board adhesive rests on the floor; these four shallow stops locate it.
            for(s=[-1,1],y=[-40,26]) translate([s*(pack_breadboard_w/2+1+fit_clearance)-1,y,pack_floor-epsilon]) cube([2,7,3]);
            translate([-pack_w/2+2.5,33,pack_floor-epsilon]) cube([pack_w-5,2,5]);
            translate([2,34,pack_floor-epsilon]) cube([2,pack_adapter_l+1,5]);
            for(s=[-1,1],y=[-34,34]) translate([s*(pack_w/2+2),y,0]) rounded_box(9,strap_w+7,5,2);
        }
        for(s=[-1,1],y=[-34,34]) translate([s*(pack_w/2+2.7),y,-epsilon]) rounded_box(strap_slot,strap_w+0.6,5+2*epsilon,0.8);
        translate([-14,-pack_l/2-1,pack_floor+1]) cube([28,5,6]);
        for(x=[-19,19],y=[40,47]) translate([x-1,y-1.5,-epsilon]) cube([2,3,pack_floor+2*epsilon]);
    }
}
assert(part=="pack_tray",str("Unknown pack part: ",part));
pack_tray();
